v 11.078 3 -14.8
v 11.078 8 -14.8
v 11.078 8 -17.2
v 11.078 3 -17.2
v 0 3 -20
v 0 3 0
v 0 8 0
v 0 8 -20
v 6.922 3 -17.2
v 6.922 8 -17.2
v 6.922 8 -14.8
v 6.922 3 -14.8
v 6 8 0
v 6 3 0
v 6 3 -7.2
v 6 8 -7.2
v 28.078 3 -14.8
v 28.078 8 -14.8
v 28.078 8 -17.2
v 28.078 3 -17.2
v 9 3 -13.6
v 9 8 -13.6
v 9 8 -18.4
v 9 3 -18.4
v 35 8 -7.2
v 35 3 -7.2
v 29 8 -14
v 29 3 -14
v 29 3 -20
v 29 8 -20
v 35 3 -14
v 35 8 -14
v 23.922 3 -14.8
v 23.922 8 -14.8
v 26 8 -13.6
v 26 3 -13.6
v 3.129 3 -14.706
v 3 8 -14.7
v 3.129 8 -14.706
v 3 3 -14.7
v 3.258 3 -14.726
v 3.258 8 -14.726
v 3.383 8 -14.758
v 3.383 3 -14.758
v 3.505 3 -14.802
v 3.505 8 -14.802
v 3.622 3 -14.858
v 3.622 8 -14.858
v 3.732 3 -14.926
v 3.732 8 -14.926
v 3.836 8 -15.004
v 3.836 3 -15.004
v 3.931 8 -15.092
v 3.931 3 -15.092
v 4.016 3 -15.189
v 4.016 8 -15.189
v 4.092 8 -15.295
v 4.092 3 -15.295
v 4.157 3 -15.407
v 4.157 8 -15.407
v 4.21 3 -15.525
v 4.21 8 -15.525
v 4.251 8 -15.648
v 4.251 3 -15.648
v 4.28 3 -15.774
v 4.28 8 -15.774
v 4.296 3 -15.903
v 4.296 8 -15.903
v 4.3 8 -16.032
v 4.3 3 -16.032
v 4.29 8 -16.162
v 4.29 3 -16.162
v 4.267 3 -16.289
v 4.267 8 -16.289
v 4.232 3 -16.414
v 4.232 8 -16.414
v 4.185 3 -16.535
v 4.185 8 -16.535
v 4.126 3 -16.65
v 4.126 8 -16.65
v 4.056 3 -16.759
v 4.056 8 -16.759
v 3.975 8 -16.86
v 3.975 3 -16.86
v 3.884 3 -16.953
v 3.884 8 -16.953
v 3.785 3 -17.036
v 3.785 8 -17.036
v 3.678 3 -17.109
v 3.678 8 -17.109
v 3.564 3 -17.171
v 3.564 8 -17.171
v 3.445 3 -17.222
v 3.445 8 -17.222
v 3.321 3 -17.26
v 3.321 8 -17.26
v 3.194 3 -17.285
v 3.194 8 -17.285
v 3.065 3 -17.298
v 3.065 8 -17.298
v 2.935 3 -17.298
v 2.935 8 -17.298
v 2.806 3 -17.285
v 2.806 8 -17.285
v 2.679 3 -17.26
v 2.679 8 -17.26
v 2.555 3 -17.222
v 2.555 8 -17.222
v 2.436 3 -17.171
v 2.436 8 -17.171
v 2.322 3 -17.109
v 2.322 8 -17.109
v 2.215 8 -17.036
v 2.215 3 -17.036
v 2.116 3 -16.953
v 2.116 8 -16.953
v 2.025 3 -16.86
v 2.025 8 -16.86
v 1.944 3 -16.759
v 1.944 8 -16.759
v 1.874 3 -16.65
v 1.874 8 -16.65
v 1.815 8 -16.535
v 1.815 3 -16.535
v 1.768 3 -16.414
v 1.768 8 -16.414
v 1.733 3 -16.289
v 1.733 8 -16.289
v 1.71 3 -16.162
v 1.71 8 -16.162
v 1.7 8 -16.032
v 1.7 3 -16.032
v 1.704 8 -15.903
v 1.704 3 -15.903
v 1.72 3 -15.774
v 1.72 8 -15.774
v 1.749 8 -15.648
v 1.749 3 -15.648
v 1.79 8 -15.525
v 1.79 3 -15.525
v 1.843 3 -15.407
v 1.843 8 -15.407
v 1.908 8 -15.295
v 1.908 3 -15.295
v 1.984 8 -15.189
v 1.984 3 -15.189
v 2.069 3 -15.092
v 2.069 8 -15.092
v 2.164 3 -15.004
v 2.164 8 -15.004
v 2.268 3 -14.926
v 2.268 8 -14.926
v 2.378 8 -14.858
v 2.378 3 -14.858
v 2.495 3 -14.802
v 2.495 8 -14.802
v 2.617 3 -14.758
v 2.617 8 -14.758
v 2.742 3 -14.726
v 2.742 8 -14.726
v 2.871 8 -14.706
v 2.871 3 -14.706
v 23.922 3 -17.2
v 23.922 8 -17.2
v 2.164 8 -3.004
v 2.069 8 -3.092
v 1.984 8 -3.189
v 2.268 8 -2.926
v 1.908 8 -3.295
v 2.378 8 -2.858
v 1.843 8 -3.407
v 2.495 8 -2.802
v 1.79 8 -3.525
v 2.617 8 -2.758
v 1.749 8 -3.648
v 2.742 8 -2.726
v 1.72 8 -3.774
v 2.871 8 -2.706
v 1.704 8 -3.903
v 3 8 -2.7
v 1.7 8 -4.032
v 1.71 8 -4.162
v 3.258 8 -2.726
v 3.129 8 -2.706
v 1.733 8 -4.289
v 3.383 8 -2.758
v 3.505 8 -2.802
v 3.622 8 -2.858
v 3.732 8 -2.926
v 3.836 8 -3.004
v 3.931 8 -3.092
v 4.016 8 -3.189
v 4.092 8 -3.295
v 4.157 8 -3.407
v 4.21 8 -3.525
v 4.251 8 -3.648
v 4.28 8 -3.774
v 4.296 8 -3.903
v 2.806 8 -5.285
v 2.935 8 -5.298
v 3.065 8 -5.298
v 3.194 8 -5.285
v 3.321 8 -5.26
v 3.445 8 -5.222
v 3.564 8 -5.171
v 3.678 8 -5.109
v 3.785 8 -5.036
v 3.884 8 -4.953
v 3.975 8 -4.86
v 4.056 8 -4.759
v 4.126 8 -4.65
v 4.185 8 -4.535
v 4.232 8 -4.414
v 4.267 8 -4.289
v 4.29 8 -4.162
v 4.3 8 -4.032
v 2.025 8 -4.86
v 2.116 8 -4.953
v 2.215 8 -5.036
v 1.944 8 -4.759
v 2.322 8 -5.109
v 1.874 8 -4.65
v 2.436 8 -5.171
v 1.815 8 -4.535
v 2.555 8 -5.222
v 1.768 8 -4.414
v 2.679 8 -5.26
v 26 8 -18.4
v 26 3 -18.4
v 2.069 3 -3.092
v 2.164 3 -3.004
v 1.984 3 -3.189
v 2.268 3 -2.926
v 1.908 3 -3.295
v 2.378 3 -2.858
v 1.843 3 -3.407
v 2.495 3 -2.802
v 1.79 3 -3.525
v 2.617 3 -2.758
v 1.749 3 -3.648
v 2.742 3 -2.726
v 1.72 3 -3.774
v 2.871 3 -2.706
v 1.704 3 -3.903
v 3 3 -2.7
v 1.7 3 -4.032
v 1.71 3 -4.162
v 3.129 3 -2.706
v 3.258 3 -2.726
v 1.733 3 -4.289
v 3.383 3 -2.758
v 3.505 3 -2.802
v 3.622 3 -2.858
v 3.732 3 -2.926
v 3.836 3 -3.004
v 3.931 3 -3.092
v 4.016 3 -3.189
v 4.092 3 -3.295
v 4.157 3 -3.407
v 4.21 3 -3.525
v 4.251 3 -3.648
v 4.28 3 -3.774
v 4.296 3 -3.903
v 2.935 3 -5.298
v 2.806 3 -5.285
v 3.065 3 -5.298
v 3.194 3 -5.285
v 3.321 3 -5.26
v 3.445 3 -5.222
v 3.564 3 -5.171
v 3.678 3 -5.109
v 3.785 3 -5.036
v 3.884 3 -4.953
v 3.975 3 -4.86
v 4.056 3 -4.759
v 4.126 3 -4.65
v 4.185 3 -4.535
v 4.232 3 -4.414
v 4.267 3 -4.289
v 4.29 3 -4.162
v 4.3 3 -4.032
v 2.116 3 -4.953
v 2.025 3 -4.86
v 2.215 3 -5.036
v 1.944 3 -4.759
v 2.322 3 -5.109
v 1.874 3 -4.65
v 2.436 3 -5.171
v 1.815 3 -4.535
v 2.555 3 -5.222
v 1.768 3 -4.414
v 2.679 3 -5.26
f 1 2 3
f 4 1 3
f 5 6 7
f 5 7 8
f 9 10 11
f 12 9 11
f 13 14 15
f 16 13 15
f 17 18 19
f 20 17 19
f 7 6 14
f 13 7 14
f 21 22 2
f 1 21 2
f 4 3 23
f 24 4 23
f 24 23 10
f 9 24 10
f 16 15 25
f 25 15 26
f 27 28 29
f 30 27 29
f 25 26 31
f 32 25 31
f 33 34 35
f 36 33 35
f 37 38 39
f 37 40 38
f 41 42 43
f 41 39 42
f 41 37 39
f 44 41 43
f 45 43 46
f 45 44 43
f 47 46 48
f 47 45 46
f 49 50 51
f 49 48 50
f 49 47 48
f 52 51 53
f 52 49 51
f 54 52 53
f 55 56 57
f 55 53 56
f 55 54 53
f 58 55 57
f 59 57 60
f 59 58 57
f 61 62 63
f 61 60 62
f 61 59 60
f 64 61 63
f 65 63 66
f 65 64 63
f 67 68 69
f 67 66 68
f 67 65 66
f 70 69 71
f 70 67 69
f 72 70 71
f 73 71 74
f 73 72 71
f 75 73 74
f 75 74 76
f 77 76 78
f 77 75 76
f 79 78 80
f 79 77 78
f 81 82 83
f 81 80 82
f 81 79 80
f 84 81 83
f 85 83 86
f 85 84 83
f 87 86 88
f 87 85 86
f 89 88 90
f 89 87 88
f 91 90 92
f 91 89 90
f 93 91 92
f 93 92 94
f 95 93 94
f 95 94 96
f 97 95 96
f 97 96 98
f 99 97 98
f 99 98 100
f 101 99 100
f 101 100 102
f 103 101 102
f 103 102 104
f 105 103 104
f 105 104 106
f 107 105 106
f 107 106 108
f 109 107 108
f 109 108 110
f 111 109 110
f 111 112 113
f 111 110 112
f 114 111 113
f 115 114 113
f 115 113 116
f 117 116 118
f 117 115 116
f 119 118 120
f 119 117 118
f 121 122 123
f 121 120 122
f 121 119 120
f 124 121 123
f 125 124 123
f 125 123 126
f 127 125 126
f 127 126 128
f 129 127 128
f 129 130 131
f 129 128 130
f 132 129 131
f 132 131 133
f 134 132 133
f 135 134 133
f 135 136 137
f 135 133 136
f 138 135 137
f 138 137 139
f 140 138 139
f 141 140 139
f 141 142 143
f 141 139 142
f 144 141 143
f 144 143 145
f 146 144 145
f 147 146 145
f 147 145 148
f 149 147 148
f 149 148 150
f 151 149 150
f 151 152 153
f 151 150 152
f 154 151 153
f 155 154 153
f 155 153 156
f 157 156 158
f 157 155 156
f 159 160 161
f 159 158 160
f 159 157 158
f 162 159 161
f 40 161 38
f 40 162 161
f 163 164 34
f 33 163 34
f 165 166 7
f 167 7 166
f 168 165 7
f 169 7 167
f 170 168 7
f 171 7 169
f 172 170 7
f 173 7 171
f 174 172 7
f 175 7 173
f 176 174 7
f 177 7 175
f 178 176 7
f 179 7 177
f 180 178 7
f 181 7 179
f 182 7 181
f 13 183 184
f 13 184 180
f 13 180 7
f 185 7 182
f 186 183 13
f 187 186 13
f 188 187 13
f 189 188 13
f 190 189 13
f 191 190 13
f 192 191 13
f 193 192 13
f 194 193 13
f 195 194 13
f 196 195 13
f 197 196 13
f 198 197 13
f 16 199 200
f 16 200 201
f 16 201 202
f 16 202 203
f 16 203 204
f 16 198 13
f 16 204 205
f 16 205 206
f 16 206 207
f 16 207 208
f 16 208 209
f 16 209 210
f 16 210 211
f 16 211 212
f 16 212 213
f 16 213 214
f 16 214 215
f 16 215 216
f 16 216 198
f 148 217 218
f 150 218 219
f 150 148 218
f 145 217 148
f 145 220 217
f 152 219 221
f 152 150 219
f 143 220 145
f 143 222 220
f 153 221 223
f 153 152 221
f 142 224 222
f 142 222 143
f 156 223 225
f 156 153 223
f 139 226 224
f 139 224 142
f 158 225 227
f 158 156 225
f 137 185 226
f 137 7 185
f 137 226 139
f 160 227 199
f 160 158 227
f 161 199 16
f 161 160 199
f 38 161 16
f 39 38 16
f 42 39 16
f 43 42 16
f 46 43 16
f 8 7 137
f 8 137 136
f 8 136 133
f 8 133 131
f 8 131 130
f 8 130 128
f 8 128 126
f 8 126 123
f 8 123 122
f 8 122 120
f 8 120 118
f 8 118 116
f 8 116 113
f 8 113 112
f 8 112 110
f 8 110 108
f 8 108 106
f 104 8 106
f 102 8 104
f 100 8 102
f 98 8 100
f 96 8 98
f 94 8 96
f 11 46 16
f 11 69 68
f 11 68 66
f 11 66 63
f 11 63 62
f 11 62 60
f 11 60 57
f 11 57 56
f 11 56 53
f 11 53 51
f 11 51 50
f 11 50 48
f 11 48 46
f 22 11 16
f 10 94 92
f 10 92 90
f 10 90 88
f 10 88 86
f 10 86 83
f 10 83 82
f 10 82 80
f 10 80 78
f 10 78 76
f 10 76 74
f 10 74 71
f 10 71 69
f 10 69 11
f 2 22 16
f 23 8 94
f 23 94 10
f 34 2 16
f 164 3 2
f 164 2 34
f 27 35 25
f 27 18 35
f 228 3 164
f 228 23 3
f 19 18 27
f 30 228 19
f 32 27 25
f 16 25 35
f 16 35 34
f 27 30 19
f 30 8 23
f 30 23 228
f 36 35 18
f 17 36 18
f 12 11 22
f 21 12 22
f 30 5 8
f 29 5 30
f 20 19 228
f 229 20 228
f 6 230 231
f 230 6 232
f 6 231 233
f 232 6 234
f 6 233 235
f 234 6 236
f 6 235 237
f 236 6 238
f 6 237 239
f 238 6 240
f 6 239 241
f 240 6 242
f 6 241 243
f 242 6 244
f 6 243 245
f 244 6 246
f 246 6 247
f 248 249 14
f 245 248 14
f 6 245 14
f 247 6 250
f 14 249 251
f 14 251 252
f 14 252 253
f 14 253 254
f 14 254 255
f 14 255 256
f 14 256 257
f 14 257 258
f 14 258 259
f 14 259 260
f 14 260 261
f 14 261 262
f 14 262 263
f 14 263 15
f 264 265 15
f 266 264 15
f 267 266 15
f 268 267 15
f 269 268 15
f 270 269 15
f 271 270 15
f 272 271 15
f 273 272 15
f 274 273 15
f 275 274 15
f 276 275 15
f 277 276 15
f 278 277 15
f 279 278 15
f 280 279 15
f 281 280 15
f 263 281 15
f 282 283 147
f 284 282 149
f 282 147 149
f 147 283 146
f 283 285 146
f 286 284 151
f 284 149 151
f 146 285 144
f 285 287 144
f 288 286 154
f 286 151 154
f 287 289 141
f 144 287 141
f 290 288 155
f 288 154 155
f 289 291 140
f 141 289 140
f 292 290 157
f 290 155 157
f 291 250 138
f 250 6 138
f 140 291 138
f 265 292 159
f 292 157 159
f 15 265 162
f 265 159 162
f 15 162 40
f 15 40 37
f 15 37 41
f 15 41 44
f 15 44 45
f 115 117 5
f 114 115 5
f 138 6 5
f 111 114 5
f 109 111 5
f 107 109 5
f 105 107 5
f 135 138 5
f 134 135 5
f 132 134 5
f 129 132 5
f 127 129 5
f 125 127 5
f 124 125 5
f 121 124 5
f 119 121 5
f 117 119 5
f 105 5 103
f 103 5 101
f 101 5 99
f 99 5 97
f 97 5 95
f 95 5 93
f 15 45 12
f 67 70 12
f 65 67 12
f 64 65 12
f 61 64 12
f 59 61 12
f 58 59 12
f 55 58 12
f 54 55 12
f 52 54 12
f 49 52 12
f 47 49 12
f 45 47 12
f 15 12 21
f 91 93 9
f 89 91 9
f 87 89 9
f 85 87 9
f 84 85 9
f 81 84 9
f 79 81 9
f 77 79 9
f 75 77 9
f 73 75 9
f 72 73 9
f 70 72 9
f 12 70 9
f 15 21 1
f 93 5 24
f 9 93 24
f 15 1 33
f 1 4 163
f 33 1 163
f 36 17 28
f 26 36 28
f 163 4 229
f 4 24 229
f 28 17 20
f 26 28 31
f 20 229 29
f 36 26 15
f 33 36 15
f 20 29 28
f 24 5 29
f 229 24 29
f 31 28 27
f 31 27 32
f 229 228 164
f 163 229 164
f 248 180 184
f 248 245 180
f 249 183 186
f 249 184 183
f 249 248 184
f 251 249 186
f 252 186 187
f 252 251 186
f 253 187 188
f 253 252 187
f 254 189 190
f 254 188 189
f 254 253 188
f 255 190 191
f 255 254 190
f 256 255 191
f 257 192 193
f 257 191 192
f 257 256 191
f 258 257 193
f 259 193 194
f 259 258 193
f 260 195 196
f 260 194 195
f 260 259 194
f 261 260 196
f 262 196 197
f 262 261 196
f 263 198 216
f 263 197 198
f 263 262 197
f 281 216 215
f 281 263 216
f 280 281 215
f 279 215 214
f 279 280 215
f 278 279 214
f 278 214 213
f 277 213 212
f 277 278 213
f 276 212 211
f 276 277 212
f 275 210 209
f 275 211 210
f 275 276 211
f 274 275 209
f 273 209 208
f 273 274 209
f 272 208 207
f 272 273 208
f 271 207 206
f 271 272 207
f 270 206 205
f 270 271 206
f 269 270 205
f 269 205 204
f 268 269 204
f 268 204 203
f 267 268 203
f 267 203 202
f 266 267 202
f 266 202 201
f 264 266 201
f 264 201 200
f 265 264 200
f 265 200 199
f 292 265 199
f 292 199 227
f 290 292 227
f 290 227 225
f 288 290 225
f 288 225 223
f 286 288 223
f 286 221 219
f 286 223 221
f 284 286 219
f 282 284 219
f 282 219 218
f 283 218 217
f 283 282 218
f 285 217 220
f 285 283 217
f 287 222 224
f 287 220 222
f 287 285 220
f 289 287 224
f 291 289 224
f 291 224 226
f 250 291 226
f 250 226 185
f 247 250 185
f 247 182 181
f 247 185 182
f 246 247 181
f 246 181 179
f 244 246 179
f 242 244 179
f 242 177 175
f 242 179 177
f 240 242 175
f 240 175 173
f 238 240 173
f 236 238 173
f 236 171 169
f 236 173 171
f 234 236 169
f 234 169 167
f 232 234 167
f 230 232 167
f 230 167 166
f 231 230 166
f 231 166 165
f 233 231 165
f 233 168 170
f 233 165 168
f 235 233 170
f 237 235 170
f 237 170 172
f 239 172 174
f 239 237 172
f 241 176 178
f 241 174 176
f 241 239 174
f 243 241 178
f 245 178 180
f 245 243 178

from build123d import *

# Parameters (mm, degrees)
SKETCH_1_W           = 35
SKETCH_1_H           = 20
EXTRUDE_1_DEPTH      = 8
SKETCH_2_W           = 29
SKETCH_2_H           = 14
CUT_EXTRUDE_2_DEPTH  = 0.8
SKETCH_3_W           = 29
SKETCH_3_H           = 7.2
CUT_EXTRUDE_4_DEPTH  = 42.097445176
SKETCH_4_W           = 6
SKETCH_4_H           = 6
CUT_EXTRUDE_5_DEPTH  = 42.097445176
SKETCH_5_R           = 1.3
CUT_EXTRUDE_6_DEPTH  = 42.097445176
CUT_EXTRUDE_START    = 8
CUT_EXTRUDE_8_DEPTH  = 50.097445176
SKETCH_6_R           = 2.2
CUT_EXTRUDE_10_DEPTH = 2
SKETCH_8_W           = 35
SKETCH_8_H           = 20
CUT_EXTRUDE_11_DEPTH = 3


with BuildPart() as part:
    # 草圖1 → 填料-伸長1 (new body)
    with BuildSketch(Plane(origin=(0, 0, 0), x_dir=(1, 0, 0), z_dir=(0, 1, 0))):
        with Locations((17.5, 10)):
            Rectangle(SKETCH_1_W, SKETCH_1_H)
    extrude(amount=EXTRUDE_1_DEPTH)

    # 草圖2 → 除料-伸長2 (cut)
    with BuildSketch(Plane(origin=(0, 0, 0), x_dir=(1, 0, 0), z_dir=(0, 1, 0))):
        with Locations((20.5, 7)):
            Rectangle(SKETCH_2_W, SKETCH_2_H)
    extrude(amount=CUT_EXTRUDE_2_DEPTH, mode=Mode.SUBTRACT)

    # 草圖3 → 除料-伸長4 (cut, through all)
    with BuildSketch(Plane(origin=(0, 0, 0), x_dir=(1, 0, 0), z_dir=(0, 1, 0))):
        with Locations((20.5, 3.6)):
            Rectangle(SKETCH_3_W, SKETCH_3_H)
    extrude(amount=CUT_EXTRUDE_4_DEPTH, mode=Mode.SUBTRACT)

    # 草圖4 → 除料-伸長5 (cut, through all)
    with BuildSketch(Plane(origin=(0, 0, 0), x_dir=(1, 0, 0), z_dir=(0, 1, 0))):
        with Locations((32, 17)):
            Rectangle(SKETCH_4_W, SKETCH_4_H)
    extrude(amount=CUT_EXTRUDE_5_DEPTH, mode=Mode.SUBTRACT)

    # 草圖5 → 除料-伸長6 (cut, through all)
    with BuildSketch(Plane(origin=(0, 0, 0), x_dir=(1, 0, 0), z_dir=(0, 1, 0))):
        with Locations(Location((3, 16, 0), (0, 0, 270))):
            Circle(SKETCH_5_R)
        with Locations(Location((3, 4, 0), (0, 0, 270))):
            Circle(SKETCH_5_R)
        with Locations(Location((9, 16, 0), (0, 0, 270))):
            Circle(SKETCH_5_R)
        with Locations(Location((26, 16, 0), (0, 0, 270))):
            Circle(SKETCH_5_R)
    extrude(amount=CUT_EXTRUDE_6_DEPTH, mode=Mode.SUBTRACT)

    # 草圖7 → 除料-伸長8 (cut, through all)
    with BuildSketch(Plane(origin=(0, 0, 0), x_dir=(1, 0, 0), z_dir=(0, 1, 0)).offset(CUT_EXTRUDE_START)):
        Polygon((26, 18.4), (23.921539031, 17.2), (23.921539031, 14.8), (26, 13.6), (28.078460969, 14.8), (28.078460969, 17.2), align=None)
        Polygon((9, 18.4), (6.921539031, 17.2), (6.921539031, 14.8), (9, 13.6), (11.078460969, 14.8), (11.078460969, 17.2), align=None)
    extrude(amount=-CUT_EXTRUDE_8_DEPTH, mode=Mode.SUBTRACT)

    # 草圖6 → 除料-伸長10 (cut)
    with BuildSketch(Plane(origin=(0, 0, 0), x_dir=(1, 0, 0), z_dir=(0, 1, 0))):
        with Locations(Location((3, 16, 0), (0, 0, 90))):
            Circle(SKETCH_6_R)
        with Locations(Location((3, 4, 0), (0, 0, 90))):
            Circle(SKETCH_6_R)
    extrude(amount=CUT_EXTRUDE_10_DEPTH, mode=Mode.SUBTRACT)

    # 草圖8 → 除料-伸長11 (cut)
    with BuildSketch(Plane(origin=(0, 0, 0), x_dir=(1, 0, 0), z_dir=(0, 1, 0))):
        with Locations((17.5, 10)):
            Rectangle(SKETCH_8_W, SKETCH_8_H)
    extrude(amount=CUT_EXTRUDE_11_DEPTH, mode=Mode.SUBTRACT)


solid = part.part
